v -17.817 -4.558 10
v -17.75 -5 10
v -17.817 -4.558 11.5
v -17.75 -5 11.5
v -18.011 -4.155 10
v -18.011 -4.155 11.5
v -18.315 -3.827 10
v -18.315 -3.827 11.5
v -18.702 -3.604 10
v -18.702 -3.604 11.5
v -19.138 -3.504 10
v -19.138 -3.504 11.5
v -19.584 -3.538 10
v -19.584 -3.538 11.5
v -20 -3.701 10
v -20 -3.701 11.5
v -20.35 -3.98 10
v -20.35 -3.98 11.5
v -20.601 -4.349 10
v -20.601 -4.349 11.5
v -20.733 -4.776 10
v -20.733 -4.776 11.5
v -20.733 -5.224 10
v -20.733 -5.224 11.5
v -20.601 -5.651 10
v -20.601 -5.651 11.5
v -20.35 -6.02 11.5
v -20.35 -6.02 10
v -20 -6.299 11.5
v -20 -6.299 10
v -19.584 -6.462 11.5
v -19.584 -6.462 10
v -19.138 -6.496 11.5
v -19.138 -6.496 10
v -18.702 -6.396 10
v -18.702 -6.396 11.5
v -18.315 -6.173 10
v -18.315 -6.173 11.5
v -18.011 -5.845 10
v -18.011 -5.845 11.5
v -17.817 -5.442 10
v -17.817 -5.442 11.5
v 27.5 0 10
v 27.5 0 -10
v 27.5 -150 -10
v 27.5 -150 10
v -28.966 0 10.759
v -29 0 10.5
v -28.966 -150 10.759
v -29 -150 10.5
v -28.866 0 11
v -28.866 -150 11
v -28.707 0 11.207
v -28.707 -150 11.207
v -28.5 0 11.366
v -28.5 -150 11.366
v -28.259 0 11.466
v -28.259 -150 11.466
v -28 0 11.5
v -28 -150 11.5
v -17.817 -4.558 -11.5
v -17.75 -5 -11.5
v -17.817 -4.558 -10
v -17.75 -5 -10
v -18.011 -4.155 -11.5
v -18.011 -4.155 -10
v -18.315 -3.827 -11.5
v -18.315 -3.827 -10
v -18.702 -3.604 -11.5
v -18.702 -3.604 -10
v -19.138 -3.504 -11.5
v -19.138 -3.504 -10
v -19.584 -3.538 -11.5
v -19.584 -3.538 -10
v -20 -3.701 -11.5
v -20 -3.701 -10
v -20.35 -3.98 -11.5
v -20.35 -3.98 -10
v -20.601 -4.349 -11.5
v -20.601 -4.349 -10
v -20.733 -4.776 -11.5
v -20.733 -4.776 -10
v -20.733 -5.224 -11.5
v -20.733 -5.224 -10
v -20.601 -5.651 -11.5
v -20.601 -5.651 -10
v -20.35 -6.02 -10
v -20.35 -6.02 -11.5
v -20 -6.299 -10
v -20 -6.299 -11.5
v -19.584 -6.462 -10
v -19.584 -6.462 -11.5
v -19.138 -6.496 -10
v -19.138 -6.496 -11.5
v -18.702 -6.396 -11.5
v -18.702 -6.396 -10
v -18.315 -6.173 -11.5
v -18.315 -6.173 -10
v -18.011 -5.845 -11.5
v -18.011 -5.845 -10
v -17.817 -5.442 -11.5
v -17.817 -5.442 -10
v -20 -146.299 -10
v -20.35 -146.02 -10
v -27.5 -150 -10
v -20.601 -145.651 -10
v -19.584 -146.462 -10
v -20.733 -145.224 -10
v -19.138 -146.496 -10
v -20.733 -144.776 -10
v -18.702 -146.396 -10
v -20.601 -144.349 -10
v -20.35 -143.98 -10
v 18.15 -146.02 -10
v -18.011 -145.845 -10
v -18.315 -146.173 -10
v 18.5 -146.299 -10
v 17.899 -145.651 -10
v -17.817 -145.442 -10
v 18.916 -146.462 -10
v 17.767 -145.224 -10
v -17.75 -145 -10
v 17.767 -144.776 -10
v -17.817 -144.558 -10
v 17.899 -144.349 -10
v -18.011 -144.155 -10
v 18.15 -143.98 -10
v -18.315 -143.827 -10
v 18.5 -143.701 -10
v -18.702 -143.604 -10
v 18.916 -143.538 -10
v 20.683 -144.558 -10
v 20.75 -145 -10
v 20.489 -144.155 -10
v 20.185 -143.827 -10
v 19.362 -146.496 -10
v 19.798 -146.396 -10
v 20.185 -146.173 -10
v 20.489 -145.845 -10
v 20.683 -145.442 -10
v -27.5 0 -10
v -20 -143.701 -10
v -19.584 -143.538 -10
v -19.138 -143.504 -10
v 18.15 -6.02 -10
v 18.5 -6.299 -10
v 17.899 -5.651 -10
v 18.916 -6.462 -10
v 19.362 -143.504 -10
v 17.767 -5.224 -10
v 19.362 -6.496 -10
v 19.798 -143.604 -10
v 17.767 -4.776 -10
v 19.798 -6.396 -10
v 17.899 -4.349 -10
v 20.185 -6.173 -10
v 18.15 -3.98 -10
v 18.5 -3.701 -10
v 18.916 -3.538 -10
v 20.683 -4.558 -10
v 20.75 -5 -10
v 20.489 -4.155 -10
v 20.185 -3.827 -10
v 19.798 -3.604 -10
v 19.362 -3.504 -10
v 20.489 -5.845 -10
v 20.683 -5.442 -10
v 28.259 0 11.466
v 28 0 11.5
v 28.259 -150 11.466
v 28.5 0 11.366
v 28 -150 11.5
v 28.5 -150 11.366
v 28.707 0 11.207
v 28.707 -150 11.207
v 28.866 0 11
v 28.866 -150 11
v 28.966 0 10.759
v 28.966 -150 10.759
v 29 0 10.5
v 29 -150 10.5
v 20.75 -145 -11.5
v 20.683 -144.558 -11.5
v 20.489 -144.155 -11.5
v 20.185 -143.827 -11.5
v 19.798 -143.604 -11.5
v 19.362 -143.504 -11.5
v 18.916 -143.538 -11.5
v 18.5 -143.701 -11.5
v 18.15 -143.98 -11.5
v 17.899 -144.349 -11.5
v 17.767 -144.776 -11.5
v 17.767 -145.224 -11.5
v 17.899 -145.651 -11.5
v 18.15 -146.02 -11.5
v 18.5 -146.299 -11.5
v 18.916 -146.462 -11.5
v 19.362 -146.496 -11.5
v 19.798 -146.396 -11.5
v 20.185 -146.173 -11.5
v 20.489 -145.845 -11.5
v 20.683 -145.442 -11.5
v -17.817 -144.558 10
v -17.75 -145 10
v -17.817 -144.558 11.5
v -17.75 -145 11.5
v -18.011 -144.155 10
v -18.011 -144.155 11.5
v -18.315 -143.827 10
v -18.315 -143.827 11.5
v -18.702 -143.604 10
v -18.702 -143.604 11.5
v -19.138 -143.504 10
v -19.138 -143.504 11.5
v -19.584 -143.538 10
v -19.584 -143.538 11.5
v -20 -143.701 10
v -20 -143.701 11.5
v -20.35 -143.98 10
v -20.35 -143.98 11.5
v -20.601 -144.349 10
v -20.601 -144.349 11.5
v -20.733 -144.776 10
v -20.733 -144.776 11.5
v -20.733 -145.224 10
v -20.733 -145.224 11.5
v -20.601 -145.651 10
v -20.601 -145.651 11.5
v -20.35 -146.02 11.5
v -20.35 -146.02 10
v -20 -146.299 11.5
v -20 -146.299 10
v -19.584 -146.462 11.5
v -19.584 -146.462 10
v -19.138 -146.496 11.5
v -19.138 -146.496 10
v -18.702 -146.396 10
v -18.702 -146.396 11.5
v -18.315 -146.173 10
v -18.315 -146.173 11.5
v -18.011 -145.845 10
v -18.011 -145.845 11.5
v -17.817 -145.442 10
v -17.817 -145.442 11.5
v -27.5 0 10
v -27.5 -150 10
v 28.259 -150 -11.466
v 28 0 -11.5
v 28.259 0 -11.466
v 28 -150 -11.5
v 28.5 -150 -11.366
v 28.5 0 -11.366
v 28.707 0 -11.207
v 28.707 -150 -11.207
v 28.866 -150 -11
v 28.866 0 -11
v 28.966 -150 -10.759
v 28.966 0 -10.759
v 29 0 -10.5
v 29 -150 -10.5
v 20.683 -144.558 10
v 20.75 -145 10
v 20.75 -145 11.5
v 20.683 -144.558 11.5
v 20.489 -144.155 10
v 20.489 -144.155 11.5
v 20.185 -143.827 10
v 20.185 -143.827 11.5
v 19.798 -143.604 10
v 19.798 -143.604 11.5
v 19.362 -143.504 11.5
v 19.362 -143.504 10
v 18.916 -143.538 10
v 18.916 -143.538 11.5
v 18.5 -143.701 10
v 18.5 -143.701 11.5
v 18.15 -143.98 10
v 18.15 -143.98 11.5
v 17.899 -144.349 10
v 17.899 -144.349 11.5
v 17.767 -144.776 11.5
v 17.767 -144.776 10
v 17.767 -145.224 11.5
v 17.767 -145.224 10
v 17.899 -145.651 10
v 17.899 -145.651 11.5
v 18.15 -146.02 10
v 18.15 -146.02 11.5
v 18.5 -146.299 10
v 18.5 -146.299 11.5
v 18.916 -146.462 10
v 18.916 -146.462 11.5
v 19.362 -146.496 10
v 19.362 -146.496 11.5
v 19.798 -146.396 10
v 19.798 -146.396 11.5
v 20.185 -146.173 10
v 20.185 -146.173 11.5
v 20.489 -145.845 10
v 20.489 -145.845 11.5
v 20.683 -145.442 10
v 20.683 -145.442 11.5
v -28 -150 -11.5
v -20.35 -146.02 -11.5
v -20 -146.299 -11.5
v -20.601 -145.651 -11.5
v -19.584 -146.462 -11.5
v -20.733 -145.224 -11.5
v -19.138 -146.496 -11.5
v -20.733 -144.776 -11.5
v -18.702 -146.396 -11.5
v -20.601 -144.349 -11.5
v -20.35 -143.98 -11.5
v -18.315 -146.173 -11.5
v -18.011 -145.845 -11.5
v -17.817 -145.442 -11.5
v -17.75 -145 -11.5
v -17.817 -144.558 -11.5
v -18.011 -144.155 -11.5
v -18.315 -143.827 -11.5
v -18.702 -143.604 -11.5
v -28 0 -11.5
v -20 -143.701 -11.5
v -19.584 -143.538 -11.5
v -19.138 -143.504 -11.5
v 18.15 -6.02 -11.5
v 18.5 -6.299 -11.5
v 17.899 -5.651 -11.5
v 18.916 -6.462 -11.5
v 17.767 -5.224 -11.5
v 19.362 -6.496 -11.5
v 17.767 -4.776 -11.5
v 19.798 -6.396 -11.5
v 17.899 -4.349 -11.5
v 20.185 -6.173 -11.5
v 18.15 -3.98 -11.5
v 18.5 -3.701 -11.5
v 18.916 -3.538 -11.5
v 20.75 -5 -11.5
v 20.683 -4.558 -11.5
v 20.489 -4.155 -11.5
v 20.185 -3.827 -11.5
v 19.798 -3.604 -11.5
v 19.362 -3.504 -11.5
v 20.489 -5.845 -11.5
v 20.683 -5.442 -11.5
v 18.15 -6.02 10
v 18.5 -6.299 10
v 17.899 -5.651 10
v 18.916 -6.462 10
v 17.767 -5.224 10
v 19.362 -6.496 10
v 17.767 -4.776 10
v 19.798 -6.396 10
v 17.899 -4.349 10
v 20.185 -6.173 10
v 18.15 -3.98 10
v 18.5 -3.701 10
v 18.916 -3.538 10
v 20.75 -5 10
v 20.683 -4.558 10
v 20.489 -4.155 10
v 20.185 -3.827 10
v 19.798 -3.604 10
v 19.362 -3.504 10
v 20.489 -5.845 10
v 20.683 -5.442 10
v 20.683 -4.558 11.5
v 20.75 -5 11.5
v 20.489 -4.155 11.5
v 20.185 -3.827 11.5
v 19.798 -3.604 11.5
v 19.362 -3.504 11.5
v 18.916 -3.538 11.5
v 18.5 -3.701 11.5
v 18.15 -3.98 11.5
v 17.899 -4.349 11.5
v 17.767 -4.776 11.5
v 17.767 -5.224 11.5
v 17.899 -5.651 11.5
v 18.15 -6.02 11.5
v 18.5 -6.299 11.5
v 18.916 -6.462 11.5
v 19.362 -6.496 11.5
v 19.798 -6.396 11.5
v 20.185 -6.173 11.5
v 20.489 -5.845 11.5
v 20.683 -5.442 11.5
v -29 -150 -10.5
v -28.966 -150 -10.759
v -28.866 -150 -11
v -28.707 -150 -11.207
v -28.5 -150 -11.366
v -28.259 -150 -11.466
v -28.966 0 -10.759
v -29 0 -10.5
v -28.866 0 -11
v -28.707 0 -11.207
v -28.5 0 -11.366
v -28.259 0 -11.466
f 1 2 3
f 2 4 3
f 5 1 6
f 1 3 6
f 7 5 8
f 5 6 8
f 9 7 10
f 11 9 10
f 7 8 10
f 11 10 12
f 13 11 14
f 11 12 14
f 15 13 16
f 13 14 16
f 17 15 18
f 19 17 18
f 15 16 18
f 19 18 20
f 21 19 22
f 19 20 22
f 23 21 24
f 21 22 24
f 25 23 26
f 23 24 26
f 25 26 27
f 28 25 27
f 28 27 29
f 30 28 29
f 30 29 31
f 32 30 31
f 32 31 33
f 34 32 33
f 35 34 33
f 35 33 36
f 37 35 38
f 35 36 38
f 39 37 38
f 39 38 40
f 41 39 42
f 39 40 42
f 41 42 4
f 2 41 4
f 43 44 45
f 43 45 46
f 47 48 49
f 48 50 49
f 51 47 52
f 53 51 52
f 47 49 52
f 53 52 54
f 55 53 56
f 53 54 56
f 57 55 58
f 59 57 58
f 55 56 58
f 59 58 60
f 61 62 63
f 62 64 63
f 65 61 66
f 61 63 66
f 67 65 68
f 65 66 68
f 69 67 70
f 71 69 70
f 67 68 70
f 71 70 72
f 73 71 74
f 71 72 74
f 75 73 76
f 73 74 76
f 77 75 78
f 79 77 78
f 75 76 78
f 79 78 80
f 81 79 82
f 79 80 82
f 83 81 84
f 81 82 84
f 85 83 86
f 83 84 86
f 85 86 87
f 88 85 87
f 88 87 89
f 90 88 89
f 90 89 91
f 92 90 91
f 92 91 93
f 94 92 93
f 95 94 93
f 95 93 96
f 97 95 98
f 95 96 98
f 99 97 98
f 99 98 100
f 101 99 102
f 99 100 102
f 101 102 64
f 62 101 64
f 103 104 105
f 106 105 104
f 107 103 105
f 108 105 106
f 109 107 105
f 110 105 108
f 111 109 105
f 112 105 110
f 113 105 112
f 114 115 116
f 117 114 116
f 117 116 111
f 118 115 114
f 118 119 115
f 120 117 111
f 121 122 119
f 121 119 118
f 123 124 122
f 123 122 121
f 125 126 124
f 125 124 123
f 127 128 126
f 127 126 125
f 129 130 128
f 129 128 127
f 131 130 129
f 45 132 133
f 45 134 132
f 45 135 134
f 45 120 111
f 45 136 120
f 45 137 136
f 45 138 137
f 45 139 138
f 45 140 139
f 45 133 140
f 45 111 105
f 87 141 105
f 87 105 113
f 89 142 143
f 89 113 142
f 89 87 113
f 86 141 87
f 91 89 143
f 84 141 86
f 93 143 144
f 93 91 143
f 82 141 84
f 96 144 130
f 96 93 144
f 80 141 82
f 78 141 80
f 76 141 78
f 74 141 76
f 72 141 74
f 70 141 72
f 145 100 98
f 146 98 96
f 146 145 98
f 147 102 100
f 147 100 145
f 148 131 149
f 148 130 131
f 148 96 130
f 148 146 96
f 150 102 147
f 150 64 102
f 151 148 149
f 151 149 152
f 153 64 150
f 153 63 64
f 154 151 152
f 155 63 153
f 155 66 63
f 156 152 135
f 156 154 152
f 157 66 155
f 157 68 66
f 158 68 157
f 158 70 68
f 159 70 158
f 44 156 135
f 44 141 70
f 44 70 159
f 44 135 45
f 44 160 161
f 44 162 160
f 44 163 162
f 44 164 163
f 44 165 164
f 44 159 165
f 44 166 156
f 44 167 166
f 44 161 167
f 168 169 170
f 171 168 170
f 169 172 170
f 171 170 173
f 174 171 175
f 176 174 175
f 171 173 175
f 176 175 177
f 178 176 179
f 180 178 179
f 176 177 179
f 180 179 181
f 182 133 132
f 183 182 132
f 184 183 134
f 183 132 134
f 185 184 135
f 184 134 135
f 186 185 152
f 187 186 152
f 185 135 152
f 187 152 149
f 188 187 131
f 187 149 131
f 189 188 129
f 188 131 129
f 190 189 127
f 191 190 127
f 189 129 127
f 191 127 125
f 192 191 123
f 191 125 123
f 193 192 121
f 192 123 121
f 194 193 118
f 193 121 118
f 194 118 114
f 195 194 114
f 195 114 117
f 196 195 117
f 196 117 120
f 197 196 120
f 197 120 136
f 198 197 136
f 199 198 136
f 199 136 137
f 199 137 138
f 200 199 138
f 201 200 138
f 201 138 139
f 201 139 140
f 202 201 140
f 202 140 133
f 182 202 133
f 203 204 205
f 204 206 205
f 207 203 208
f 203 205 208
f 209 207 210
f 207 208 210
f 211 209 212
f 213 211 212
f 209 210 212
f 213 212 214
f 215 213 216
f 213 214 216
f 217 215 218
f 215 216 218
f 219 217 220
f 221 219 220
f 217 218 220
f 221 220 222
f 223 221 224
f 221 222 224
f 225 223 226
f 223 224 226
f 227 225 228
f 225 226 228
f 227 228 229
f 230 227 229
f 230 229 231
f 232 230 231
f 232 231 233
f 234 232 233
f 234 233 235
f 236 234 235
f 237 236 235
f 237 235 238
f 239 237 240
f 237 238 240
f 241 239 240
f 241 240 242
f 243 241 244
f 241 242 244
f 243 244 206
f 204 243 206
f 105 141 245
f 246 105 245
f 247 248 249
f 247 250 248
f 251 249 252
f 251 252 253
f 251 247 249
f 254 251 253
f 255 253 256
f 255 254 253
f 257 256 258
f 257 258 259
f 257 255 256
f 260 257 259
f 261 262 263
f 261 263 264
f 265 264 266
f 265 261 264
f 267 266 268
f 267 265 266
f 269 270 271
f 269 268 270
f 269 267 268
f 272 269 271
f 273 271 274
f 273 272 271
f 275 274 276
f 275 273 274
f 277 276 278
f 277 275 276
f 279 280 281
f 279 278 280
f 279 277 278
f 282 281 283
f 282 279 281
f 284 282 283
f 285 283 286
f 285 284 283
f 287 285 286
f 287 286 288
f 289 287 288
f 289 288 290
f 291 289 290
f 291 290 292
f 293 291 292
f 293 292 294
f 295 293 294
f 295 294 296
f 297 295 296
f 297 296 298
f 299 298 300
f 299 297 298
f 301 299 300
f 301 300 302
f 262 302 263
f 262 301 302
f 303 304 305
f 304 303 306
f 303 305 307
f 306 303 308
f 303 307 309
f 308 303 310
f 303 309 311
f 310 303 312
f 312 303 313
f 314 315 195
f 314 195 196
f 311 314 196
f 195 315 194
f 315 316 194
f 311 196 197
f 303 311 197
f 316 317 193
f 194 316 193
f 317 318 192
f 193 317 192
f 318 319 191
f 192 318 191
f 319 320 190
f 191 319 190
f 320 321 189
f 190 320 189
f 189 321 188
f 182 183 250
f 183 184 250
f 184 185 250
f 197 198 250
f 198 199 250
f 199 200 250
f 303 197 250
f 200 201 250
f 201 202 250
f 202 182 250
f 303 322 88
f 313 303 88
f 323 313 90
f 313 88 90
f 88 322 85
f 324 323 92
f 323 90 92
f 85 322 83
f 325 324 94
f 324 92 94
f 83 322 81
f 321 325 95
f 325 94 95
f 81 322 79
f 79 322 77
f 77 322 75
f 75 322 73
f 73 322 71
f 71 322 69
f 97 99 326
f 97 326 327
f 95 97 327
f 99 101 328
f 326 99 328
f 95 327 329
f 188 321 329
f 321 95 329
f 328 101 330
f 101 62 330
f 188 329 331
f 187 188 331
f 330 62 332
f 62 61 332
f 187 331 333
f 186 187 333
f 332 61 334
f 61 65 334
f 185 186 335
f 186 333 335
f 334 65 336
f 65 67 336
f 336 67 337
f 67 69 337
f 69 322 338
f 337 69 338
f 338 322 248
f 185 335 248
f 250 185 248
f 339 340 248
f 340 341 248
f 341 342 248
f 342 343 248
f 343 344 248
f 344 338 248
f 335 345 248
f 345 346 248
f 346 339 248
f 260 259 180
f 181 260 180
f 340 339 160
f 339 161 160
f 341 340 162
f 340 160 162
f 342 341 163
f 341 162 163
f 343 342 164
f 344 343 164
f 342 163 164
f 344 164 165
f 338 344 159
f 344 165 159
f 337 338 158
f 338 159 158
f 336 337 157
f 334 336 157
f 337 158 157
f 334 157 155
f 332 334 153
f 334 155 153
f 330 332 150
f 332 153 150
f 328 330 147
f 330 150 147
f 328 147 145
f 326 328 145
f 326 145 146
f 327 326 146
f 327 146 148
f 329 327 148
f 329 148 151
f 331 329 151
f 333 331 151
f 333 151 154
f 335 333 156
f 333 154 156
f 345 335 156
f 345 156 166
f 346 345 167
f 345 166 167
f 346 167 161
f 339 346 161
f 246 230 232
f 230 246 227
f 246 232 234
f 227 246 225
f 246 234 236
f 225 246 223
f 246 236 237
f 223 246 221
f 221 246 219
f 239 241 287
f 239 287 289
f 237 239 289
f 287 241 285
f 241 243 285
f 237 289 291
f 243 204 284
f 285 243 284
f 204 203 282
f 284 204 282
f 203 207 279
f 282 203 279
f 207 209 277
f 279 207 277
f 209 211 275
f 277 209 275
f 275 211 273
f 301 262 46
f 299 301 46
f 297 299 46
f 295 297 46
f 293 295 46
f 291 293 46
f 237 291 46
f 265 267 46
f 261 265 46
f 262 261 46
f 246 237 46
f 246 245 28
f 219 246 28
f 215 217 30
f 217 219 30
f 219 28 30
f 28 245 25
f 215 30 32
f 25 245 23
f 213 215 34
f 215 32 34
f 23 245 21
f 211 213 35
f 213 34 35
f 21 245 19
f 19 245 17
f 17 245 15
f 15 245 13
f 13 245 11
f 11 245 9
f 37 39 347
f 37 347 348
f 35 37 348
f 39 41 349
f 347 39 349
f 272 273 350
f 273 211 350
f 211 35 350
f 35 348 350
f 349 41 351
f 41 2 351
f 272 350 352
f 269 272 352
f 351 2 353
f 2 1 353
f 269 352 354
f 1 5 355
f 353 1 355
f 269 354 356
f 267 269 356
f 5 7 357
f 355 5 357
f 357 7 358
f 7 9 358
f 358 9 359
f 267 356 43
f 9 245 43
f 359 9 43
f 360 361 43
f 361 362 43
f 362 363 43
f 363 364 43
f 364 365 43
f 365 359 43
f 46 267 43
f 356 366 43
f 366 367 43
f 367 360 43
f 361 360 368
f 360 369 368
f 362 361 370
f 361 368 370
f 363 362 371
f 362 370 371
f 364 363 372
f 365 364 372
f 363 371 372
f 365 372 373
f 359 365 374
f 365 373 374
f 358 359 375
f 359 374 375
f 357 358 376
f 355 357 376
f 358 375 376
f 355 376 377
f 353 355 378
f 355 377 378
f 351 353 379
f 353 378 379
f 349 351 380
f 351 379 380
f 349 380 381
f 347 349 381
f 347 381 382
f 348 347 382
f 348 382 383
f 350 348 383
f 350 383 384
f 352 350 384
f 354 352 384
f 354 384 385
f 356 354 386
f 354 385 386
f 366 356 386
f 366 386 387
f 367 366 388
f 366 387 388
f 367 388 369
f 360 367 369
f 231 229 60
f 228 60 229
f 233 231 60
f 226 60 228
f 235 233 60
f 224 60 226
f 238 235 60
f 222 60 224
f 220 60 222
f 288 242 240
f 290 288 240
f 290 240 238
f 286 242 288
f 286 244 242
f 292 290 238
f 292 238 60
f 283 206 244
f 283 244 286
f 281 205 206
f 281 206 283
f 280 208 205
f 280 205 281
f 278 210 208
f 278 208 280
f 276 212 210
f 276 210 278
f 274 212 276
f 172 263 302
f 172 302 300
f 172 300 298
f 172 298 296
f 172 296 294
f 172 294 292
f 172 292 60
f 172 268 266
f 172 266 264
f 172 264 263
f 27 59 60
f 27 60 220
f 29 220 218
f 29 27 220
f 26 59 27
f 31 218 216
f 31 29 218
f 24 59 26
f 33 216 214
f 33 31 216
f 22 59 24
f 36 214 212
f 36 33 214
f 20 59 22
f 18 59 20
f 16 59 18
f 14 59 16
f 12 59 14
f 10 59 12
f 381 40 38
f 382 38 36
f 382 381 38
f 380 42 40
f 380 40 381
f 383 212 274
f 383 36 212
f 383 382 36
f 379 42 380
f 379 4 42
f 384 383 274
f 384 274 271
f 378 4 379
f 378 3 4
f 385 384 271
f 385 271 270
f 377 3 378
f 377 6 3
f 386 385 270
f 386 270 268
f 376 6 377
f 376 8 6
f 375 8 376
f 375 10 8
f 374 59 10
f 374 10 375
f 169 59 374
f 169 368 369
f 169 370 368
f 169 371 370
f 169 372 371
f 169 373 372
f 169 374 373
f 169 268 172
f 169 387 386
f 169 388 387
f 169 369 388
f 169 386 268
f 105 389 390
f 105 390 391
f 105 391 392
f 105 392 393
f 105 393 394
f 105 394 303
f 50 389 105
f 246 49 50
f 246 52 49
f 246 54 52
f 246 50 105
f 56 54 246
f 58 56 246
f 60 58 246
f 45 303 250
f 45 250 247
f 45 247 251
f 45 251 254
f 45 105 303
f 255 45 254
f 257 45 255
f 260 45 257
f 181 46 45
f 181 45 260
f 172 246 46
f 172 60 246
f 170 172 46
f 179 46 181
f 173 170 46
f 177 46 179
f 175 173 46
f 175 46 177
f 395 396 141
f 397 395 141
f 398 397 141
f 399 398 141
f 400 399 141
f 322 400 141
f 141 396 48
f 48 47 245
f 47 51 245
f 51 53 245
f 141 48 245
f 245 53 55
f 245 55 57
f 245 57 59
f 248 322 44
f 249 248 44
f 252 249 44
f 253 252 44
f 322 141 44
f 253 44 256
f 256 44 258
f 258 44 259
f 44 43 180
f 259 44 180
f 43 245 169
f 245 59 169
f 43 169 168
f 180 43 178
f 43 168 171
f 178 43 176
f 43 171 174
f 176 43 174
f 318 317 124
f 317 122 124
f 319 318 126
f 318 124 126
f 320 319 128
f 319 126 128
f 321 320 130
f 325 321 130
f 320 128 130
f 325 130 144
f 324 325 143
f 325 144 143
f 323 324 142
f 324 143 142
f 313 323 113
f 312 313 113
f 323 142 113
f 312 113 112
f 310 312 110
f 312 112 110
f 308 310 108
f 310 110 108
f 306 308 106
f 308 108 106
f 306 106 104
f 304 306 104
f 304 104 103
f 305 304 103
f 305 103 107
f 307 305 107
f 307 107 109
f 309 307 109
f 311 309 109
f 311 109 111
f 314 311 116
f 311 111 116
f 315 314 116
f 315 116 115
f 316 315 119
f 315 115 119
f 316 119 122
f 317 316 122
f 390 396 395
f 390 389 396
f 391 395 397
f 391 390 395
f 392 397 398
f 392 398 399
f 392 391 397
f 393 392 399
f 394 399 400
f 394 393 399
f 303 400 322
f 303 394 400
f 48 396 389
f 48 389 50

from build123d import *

# Parameters (mm, degrees)
F0_W     = 58
F0_H     = 23
F0_W_2   = 55
F0_H_2   = 20
F1_DEPTH = 150
F2_R     = 1
F3_R     = 1.5
F4_DEPTH = 15
F5_DEPTH = 15
F6_DEPTH = 15


with BuildPart() as f1:
    # F0 (on Front) → F1 (new body)
    with BuildSketch(Plane.XZ):
        Rectangle(F0_W, F0_H)
        Rectangle(F0_W_2, F0_H_2, mode=Mode.SUBTRACT)
    extrude(amount=F1_DEPTH)

    # F2
    f2_edges = [f1.edges().sort_by_distance(p)[0] for p in [
        (-29, -75, 11.5),
        (29, -75, 11.5),
        (-29, -75, -11.5),
        (29, -75, -11.5),
    ]]
    fillet(f2_edges, radius=F2_R)

    # F3 (on Top) → F4 (cut, symmetric)
    with BuildSketch(Plane.XY):
        with Locations((-19.25, -5)):
            Circle(F3_R)
    extrude(amount=F4_DEPTH, both=True, mode=Mode.SUBTRACT)

    # F3 (on Top) → F5 (cut, symmetric)
    with BuildSketch(Plane.XY):
        with Locations((19.25, -5)):
            Circle(F3_R)
    extrude(amount=F5_DEPTH, both=True, mode=Mode.SUBTRACT)

    # F3 (on Top) → F6 (cut, symmetric)
    with BuildSketch(Plane.XY):
        with Locations((19.25, -145)):
            Circle(F3_R)
        with Locations((-19.25, -145)):
            Circle(F3_R)
    extrude(amount=F6_DEPTH, both=True, mode=Mode.SUBTRACT)


solid = f1.part
